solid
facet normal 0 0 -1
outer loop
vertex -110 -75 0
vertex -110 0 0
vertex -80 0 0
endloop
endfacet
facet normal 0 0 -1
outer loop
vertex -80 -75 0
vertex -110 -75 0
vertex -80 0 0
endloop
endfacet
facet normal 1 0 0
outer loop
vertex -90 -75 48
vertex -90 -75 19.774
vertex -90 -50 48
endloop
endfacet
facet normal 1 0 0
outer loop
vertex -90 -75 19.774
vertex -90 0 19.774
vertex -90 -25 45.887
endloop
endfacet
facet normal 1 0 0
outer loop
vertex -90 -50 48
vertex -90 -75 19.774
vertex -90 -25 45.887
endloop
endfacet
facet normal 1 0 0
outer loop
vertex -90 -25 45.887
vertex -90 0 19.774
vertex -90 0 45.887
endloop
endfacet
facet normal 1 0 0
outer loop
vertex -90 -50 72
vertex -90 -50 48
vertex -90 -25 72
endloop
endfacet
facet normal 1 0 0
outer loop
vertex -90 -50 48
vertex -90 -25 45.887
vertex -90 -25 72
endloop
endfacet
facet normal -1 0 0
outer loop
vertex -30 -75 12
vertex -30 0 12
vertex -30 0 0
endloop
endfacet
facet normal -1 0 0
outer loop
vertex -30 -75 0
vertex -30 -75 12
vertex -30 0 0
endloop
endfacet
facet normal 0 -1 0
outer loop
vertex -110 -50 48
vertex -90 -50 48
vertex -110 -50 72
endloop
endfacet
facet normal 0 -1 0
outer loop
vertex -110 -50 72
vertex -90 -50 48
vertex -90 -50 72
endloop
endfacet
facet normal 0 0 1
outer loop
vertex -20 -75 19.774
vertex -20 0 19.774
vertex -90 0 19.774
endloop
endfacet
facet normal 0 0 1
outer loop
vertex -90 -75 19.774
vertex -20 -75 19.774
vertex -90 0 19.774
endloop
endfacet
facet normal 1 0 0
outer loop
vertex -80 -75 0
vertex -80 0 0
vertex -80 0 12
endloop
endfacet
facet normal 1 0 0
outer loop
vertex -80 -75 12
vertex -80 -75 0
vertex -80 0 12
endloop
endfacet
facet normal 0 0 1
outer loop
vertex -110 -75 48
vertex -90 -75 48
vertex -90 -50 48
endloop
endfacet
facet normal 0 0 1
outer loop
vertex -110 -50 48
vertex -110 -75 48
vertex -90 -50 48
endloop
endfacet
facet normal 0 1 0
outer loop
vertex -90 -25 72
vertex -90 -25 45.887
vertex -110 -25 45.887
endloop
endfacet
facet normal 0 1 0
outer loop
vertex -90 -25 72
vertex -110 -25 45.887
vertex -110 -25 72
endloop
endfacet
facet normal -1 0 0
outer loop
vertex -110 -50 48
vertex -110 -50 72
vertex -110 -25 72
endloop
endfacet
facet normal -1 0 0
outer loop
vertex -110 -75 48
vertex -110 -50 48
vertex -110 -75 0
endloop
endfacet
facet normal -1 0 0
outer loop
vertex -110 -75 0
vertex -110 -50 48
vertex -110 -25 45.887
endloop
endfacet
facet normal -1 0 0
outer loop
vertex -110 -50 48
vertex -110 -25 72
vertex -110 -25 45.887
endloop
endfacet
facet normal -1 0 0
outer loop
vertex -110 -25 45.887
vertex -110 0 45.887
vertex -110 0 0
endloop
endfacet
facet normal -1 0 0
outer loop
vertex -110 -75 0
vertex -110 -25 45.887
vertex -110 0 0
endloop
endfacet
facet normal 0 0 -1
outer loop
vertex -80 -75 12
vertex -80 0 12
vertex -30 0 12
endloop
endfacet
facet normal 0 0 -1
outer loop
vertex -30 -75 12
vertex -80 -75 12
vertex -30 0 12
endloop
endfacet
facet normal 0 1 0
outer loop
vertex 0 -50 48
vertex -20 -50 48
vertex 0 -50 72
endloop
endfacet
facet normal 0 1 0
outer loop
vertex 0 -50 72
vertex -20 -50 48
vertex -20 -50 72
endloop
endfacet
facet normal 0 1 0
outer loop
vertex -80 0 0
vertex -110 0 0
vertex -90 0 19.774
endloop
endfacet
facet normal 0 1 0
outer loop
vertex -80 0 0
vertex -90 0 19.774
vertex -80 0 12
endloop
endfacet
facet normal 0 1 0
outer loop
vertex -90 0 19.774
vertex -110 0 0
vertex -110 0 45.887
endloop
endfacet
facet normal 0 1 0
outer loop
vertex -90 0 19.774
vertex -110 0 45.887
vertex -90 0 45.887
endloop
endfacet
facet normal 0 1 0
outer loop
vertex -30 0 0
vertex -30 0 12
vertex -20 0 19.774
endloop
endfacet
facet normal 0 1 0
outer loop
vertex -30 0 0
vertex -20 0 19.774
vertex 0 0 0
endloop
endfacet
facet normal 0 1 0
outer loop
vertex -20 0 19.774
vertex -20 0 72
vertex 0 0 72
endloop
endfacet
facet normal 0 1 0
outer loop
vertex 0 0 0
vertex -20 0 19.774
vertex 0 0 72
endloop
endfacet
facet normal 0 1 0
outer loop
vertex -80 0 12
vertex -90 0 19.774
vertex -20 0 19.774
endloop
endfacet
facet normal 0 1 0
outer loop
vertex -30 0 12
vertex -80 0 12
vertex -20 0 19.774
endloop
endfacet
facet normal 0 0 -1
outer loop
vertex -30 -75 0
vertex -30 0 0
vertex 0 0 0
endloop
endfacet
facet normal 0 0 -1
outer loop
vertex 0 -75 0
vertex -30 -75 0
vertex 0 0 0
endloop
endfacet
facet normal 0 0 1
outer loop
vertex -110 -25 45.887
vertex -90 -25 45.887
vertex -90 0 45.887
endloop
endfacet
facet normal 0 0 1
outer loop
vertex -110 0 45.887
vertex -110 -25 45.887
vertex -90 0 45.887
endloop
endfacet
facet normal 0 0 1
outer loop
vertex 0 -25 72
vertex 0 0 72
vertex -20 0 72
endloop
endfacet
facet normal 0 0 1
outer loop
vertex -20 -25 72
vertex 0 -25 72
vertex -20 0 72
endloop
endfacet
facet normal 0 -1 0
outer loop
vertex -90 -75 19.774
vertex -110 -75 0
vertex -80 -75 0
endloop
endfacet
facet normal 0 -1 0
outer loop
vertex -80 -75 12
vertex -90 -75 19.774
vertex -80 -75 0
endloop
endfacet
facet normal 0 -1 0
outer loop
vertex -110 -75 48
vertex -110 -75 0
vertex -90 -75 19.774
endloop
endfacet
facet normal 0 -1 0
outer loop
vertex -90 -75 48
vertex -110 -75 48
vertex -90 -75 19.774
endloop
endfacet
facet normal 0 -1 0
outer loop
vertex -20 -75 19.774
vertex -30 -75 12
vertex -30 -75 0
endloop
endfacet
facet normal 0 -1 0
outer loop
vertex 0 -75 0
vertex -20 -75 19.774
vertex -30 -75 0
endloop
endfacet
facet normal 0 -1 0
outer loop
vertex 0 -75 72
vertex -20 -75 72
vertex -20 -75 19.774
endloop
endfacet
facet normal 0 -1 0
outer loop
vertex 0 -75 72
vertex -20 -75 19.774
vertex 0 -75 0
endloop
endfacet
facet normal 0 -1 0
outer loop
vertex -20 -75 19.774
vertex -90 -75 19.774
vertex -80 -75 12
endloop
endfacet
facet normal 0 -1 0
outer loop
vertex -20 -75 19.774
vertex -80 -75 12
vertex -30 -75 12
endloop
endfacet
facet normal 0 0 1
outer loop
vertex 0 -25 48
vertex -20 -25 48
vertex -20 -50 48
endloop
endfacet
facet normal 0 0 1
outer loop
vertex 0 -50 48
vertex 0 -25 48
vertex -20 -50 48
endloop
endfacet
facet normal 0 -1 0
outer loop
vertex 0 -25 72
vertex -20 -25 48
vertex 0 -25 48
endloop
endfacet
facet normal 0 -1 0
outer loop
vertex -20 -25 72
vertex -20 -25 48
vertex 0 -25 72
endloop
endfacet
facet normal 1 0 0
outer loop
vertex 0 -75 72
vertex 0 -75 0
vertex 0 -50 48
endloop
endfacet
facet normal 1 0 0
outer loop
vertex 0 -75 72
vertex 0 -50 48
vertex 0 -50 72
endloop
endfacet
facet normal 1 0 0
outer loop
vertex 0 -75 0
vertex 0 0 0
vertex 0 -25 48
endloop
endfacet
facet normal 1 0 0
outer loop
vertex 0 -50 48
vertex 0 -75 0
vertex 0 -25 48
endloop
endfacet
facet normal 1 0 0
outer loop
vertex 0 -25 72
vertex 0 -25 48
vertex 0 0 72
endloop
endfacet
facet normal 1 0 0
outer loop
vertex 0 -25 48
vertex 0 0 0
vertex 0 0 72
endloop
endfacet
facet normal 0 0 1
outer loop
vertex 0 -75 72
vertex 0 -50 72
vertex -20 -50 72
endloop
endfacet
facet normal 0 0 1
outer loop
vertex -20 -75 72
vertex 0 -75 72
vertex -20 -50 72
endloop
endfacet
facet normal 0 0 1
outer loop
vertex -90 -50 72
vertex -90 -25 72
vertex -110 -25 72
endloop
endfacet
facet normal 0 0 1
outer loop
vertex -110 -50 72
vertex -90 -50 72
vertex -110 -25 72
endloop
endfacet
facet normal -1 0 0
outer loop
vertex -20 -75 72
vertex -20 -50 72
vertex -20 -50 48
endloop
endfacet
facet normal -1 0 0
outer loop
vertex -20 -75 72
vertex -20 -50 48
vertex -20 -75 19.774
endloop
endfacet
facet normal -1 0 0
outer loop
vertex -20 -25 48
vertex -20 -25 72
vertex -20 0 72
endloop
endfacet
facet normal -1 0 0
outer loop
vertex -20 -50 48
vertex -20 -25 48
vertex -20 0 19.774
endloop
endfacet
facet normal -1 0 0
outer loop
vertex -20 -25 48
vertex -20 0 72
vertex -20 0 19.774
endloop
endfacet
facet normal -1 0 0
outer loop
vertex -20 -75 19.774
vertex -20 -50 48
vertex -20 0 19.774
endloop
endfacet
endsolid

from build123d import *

# Parameters (mm, degrees)
F1_DEPTH = 75
F2_W     = 25
F2_H     = 24
F2_H_2   = 26.113208
F3_DEPTH = 20
F4_W     = 25
F4_H     = 24
F5_DEPTH = 20


with BuildPart() as f1:
    # F0 (on Front) → F1 (new body)
    with BuildSketch(Plane.XZ):
        Polygon((-30, 0), (0, 0), (0, 72), (-20, 72), (-20, 19.773584), (-90, 19.773584), (-90, 72), (-110, 72), (-110, 0), (-80, 0), (-80, 12), (-30, 12), align=None)
    extrude(amount=F1_DEPTH)

    # F2 (on face) → F3 (cut)
    with BuildSketch(Plane.YZ.offset(-90)):
        with Locations((-62.5, 60)):
            Rectangle(F2_W, F2_H)
        with Locations((-12.5, 58.943396)):
            Rectangle(F2_W, F2_H_2)
    extrude(amount=-F3_DEPTH, mode=Mode.SUBTRACT)

    # F4 (on face) → F5 (cut)
    with BuildSketch(Plane(origin=(-20, 0, 0), x_dir=(0, -1, 0), z_dir=(-1, 0, 0))):
        with Locations((37.5, 60)):
            Rectangle(F4_W, F4_H)
    extrude(amount=-F5_DEPTH, mode=Mode.SUBTRACT)


solid = f1.part
